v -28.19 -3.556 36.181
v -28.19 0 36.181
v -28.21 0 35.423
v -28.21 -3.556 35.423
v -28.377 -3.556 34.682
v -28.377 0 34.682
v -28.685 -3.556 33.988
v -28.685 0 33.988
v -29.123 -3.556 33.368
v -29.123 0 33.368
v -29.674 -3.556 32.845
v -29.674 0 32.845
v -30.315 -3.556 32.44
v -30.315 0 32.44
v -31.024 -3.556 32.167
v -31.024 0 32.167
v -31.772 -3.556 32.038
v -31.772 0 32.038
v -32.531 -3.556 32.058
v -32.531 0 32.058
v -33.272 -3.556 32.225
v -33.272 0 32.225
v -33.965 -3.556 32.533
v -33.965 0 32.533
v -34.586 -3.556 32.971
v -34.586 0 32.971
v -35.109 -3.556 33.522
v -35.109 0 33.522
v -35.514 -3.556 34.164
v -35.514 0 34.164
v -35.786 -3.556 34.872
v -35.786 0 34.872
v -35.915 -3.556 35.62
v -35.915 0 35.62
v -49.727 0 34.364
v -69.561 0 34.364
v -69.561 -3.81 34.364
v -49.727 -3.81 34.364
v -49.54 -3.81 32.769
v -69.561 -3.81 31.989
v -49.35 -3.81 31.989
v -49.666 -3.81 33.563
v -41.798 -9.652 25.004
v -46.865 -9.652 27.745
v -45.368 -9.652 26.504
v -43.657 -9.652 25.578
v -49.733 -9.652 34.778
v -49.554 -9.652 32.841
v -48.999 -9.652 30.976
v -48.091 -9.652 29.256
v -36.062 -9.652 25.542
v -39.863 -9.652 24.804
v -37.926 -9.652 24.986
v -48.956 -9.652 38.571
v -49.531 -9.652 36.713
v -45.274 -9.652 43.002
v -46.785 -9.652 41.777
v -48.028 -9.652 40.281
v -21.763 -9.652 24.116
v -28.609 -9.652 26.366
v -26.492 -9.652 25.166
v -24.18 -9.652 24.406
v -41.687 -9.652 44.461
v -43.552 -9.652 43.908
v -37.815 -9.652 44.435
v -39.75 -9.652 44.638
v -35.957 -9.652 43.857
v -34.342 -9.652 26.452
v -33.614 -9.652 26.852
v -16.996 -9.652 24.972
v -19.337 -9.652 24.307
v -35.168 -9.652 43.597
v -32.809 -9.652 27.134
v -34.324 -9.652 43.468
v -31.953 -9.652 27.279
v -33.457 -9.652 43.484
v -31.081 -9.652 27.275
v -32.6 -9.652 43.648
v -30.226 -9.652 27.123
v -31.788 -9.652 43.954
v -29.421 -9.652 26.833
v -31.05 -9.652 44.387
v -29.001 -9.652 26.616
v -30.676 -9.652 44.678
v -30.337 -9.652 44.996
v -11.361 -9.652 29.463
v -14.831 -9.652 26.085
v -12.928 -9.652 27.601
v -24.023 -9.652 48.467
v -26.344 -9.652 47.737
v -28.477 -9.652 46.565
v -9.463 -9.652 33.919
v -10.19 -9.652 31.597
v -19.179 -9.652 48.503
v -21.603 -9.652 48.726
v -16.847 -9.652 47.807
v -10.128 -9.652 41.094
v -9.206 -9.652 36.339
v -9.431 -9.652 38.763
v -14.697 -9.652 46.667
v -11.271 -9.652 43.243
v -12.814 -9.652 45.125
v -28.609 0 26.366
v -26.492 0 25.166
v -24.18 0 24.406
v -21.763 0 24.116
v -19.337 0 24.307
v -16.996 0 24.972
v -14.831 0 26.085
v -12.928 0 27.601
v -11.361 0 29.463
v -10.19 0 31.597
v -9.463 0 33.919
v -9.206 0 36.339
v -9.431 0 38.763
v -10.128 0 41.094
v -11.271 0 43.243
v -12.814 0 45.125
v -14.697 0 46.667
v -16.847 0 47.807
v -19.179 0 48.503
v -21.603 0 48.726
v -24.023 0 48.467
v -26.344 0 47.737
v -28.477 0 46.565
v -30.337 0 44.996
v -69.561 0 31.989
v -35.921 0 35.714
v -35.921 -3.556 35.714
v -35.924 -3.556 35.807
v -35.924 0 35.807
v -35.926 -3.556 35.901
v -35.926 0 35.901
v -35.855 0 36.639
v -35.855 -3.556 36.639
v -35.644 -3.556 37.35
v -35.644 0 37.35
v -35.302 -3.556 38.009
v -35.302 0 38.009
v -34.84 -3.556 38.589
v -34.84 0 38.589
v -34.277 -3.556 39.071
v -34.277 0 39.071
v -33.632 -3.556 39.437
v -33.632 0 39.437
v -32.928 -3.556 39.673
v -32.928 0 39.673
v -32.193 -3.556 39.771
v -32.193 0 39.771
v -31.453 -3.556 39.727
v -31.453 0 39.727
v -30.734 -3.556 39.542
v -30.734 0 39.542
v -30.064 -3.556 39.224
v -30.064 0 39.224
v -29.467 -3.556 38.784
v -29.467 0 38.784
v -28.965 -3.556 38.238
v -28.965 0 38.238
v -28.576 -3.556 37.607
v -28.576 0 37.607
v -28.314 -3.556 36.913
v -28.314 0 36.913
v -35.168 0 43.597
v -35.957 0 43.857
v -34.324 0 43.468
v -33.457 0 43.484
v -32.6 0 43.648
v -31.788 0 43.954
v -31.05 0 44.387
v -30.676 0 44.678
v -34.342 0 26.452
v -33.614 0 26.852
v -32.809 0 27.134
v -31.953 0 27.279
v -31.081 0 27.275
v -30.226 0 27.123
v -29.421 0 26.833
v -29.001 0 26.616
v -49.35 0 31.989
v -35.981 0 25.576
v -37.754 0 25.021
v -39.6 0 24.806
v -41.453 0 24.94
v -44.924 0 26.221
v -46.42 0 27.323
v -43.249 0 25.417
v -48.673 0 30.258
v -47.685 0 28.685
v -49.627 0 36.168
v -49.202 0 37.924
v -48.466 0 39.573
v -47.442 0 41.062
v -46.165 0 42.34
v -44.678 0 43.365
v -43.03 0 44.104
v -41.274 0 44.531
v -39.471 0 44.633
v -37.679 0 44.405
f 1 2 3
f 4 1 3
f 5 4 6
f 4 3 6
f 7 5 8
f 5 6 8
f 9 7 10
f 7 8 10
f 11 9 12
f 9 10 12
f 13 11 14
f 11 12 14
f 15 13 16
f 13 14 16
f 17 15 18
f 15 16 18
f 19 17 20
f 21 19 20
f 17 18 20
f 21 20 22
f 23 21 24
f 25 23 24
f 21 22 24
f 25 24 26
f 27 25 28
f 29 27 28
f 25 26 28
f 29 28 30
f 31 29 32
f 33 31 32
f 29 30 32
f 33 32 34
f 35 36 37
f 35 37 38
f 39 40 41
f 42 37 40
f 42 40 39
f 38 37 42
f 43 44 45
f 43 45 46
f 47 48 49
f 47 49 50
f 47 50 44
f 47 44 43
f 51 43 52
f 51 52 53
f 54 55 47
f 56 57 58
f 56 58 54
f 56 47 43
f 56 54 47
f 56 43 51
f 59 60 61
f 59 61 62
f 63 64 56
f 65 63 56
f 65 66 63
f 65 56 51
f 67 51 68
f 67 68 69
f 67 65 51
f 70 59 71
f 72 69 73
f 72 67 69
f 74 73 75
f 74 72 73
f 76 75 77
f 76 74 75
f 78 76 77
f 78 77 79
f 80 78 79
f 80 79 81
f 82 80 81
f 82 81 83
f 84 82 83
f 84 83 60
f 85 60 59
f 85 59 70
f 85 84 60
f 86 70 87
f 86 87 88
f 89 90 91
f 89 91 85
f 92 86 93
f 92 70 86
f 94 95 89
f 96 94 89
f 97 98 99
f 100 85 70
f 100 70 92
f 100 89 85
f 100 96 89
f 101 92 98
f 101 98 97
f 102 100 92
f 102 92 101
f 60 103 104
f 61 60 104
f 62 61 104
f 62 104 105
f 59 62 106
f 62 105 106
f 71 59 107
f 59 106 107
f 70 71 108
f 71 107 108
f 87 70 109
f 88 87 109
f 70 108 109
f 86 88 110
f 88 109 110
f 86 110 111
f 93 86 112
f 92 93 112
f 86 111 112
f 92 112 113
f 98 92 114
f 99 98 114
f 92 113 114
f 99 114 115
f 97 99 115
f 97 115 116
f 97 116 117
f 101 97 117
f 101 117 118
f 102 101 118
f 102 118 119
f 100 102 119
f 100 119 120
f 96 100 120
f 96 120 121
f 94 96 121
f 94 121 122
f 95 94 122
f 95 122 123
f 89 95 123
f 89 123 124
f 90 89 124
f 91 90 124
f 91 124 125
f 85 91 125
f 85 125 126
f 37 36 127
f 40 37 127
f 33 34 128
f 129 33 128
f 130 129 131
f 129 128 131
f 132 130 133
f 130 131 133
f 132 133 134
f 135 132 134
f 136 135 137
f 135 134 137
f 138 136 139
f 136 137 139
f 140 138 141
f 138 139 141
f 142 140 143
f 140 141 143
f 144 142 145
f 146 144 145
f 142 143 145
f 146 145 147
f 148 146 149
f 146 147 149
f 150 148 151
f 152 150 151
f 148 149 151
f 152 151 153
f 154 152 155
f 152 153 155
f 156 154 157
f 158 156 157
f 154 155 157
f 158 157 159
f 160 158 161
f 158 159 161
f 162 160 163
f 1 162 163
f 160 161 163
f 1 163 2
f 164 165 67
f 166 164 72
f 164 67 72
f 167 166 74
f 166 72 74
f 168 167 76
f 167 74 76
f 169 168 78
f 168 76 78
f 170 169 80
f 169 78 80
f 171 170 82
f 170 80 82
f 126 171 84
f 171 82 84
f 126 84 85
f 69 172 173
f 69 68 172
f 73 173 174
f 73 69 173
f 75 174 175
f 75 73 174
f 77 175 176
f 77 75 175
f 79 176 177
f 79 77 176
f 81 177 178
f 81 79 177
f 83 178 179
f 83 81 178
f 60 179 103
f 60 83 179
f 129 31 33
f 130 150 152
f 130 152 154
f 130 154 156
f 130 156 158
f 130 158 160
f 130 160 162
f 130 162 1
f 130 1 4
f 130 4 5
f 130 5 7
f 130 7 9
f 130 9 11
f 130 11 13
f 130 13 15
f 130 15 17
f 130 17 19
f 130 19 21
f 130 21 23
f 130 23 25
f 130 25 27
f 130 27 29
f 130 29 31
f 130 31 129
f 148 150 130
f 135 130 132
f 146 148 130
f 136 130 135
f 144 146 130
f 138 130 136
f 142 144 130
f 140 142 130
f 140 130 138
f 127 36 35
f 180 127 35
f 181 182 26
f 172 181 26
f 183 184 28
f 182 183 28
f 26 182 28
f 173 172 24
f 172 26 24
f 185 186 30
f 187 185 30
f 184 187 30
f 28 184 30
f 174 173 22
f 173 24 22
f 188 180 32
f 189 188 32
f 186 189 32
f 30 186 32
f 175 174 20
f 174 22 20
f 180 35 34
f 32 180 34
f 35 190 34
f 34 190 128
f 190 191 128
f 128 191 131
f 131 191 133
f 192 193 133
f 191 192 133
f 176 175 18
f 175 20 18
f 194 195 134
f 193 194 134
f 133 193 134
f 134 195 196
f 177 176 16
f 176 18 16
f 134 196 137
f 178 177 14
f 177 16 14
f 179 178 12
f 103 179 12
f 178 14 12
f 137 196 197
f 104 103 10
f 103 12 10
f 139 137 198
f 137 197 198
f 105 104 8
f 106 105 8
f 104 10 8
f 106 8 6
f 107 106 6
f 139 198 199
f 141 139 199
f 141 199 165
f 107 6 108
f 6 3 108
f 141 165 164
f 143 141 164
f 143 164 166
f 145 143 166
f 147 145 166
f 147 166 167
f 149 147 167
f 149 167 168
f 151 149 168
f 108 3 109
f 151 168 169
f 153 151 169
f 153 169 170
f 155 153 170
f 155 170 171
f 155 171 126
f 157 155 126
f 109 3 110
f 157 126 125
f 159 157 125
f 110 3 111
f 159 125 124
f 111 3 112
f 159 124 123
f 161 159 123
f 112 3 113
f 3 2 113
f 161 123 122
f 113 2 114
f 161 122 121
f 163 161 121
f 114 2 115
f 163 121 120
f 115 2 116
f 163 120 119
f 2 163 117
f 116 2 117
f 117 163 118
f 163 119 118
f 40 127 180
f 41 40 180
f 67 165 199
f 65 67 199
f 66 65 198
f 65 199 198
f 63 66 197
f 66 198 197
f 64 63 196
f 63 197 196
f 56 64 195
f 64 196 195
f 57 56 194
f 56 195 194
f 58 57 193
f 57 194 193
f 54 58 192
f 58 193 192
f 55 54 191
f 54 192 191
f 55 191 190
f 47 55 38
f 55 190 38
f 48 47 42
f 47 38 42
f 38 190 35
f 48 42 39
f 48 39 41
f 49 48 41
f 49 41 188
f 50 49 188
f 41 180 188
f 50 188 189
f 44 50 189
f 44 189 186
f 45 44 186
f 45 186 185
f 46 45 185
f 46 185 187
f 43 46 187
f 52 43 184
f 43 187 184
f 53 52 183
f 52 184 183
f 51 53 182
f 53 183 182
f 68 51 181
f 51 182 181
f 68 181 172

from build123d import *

# Parameters (mm, degrees)
F1_DEPTH = 9.652
F2_W     = 22.6732008159
F2_H     = 1.1748634279
F2_H_2   = 1.2006908655
F3_DEPTH = 3.81
F4_R     = 5.08
F6_DEPTH = 3.556


with BuildPart() as f1:
    # F0 (on Front) → F1 (new body)
    with BuildSketch(Plane.XZ):
        with BuildLine():
            ThreePointArc((-31.5301379097, 29.2723811601), (-9.2584932634, 37.5565839315), (-32.6741015598, 41.6017611729))
            ThreePointArc((-32.6741015598, 41.6017611729), (-49.691111152, 33.8051020972), (-31.5301379097, 29.2723811601))
        make_face()
    extrude(amount=F1_DEPTH)

    # F2 (on Front) → F3 (join)
    with BuildSketch(Plane.XZ):
        with Locations((-58.2245606929, 33.776761964)):
            Rectangle(F2_W, F2_H)
        with Locations((-58.2245606929, 32.5889848173)):
            Rectangle(F2_W, F2_H_2)
    extrude(amount=F3_DEPTH)

    # F4
    f4_edges = [f1.edges().sort_by_distance(p)[0] for p in [
        (-32.674102, -4.826, 41.601761),
        (-31.530138, -4.826, 29.272381),
    ]]
    fillet(f4_edges, radius=F4_R)

    # F5 (on face) → F6 (cut)
    with BuildSketch(Plane(origin=(0, 0, 0), x_dir=(-1, 0, 0), z_dir=(0, 1, 0))):
        with BuildLine():
            ThreePointArc((35.9255568085, 35.9008908942), (32.1931363304, 39.7711420697), (28.1901409202, 36.1814576083))
            Line((28.1901409202, 36.1814576083), (35.9153805385, 35.6203241801))
            ThreePointArc((35.9153805385, 35.6203241801), (35.9230119048, 35.7605152931), (35.9255568085, 35.9008908942))
        make_face()
        with BuildLine():
            Line((35.9153805385, 35.6203241801), (28.1901409202, 36.1814576083))
            ThreePointArc((28.1901409202, 36.1814576083), (31.7721940152, 32.038271085), (35.9153805385, 35.6203241801))
        make_face()
    extrude(amount=-F6_DEPTH, mode=Mode.SUBTRACT)


solid = f1.part
